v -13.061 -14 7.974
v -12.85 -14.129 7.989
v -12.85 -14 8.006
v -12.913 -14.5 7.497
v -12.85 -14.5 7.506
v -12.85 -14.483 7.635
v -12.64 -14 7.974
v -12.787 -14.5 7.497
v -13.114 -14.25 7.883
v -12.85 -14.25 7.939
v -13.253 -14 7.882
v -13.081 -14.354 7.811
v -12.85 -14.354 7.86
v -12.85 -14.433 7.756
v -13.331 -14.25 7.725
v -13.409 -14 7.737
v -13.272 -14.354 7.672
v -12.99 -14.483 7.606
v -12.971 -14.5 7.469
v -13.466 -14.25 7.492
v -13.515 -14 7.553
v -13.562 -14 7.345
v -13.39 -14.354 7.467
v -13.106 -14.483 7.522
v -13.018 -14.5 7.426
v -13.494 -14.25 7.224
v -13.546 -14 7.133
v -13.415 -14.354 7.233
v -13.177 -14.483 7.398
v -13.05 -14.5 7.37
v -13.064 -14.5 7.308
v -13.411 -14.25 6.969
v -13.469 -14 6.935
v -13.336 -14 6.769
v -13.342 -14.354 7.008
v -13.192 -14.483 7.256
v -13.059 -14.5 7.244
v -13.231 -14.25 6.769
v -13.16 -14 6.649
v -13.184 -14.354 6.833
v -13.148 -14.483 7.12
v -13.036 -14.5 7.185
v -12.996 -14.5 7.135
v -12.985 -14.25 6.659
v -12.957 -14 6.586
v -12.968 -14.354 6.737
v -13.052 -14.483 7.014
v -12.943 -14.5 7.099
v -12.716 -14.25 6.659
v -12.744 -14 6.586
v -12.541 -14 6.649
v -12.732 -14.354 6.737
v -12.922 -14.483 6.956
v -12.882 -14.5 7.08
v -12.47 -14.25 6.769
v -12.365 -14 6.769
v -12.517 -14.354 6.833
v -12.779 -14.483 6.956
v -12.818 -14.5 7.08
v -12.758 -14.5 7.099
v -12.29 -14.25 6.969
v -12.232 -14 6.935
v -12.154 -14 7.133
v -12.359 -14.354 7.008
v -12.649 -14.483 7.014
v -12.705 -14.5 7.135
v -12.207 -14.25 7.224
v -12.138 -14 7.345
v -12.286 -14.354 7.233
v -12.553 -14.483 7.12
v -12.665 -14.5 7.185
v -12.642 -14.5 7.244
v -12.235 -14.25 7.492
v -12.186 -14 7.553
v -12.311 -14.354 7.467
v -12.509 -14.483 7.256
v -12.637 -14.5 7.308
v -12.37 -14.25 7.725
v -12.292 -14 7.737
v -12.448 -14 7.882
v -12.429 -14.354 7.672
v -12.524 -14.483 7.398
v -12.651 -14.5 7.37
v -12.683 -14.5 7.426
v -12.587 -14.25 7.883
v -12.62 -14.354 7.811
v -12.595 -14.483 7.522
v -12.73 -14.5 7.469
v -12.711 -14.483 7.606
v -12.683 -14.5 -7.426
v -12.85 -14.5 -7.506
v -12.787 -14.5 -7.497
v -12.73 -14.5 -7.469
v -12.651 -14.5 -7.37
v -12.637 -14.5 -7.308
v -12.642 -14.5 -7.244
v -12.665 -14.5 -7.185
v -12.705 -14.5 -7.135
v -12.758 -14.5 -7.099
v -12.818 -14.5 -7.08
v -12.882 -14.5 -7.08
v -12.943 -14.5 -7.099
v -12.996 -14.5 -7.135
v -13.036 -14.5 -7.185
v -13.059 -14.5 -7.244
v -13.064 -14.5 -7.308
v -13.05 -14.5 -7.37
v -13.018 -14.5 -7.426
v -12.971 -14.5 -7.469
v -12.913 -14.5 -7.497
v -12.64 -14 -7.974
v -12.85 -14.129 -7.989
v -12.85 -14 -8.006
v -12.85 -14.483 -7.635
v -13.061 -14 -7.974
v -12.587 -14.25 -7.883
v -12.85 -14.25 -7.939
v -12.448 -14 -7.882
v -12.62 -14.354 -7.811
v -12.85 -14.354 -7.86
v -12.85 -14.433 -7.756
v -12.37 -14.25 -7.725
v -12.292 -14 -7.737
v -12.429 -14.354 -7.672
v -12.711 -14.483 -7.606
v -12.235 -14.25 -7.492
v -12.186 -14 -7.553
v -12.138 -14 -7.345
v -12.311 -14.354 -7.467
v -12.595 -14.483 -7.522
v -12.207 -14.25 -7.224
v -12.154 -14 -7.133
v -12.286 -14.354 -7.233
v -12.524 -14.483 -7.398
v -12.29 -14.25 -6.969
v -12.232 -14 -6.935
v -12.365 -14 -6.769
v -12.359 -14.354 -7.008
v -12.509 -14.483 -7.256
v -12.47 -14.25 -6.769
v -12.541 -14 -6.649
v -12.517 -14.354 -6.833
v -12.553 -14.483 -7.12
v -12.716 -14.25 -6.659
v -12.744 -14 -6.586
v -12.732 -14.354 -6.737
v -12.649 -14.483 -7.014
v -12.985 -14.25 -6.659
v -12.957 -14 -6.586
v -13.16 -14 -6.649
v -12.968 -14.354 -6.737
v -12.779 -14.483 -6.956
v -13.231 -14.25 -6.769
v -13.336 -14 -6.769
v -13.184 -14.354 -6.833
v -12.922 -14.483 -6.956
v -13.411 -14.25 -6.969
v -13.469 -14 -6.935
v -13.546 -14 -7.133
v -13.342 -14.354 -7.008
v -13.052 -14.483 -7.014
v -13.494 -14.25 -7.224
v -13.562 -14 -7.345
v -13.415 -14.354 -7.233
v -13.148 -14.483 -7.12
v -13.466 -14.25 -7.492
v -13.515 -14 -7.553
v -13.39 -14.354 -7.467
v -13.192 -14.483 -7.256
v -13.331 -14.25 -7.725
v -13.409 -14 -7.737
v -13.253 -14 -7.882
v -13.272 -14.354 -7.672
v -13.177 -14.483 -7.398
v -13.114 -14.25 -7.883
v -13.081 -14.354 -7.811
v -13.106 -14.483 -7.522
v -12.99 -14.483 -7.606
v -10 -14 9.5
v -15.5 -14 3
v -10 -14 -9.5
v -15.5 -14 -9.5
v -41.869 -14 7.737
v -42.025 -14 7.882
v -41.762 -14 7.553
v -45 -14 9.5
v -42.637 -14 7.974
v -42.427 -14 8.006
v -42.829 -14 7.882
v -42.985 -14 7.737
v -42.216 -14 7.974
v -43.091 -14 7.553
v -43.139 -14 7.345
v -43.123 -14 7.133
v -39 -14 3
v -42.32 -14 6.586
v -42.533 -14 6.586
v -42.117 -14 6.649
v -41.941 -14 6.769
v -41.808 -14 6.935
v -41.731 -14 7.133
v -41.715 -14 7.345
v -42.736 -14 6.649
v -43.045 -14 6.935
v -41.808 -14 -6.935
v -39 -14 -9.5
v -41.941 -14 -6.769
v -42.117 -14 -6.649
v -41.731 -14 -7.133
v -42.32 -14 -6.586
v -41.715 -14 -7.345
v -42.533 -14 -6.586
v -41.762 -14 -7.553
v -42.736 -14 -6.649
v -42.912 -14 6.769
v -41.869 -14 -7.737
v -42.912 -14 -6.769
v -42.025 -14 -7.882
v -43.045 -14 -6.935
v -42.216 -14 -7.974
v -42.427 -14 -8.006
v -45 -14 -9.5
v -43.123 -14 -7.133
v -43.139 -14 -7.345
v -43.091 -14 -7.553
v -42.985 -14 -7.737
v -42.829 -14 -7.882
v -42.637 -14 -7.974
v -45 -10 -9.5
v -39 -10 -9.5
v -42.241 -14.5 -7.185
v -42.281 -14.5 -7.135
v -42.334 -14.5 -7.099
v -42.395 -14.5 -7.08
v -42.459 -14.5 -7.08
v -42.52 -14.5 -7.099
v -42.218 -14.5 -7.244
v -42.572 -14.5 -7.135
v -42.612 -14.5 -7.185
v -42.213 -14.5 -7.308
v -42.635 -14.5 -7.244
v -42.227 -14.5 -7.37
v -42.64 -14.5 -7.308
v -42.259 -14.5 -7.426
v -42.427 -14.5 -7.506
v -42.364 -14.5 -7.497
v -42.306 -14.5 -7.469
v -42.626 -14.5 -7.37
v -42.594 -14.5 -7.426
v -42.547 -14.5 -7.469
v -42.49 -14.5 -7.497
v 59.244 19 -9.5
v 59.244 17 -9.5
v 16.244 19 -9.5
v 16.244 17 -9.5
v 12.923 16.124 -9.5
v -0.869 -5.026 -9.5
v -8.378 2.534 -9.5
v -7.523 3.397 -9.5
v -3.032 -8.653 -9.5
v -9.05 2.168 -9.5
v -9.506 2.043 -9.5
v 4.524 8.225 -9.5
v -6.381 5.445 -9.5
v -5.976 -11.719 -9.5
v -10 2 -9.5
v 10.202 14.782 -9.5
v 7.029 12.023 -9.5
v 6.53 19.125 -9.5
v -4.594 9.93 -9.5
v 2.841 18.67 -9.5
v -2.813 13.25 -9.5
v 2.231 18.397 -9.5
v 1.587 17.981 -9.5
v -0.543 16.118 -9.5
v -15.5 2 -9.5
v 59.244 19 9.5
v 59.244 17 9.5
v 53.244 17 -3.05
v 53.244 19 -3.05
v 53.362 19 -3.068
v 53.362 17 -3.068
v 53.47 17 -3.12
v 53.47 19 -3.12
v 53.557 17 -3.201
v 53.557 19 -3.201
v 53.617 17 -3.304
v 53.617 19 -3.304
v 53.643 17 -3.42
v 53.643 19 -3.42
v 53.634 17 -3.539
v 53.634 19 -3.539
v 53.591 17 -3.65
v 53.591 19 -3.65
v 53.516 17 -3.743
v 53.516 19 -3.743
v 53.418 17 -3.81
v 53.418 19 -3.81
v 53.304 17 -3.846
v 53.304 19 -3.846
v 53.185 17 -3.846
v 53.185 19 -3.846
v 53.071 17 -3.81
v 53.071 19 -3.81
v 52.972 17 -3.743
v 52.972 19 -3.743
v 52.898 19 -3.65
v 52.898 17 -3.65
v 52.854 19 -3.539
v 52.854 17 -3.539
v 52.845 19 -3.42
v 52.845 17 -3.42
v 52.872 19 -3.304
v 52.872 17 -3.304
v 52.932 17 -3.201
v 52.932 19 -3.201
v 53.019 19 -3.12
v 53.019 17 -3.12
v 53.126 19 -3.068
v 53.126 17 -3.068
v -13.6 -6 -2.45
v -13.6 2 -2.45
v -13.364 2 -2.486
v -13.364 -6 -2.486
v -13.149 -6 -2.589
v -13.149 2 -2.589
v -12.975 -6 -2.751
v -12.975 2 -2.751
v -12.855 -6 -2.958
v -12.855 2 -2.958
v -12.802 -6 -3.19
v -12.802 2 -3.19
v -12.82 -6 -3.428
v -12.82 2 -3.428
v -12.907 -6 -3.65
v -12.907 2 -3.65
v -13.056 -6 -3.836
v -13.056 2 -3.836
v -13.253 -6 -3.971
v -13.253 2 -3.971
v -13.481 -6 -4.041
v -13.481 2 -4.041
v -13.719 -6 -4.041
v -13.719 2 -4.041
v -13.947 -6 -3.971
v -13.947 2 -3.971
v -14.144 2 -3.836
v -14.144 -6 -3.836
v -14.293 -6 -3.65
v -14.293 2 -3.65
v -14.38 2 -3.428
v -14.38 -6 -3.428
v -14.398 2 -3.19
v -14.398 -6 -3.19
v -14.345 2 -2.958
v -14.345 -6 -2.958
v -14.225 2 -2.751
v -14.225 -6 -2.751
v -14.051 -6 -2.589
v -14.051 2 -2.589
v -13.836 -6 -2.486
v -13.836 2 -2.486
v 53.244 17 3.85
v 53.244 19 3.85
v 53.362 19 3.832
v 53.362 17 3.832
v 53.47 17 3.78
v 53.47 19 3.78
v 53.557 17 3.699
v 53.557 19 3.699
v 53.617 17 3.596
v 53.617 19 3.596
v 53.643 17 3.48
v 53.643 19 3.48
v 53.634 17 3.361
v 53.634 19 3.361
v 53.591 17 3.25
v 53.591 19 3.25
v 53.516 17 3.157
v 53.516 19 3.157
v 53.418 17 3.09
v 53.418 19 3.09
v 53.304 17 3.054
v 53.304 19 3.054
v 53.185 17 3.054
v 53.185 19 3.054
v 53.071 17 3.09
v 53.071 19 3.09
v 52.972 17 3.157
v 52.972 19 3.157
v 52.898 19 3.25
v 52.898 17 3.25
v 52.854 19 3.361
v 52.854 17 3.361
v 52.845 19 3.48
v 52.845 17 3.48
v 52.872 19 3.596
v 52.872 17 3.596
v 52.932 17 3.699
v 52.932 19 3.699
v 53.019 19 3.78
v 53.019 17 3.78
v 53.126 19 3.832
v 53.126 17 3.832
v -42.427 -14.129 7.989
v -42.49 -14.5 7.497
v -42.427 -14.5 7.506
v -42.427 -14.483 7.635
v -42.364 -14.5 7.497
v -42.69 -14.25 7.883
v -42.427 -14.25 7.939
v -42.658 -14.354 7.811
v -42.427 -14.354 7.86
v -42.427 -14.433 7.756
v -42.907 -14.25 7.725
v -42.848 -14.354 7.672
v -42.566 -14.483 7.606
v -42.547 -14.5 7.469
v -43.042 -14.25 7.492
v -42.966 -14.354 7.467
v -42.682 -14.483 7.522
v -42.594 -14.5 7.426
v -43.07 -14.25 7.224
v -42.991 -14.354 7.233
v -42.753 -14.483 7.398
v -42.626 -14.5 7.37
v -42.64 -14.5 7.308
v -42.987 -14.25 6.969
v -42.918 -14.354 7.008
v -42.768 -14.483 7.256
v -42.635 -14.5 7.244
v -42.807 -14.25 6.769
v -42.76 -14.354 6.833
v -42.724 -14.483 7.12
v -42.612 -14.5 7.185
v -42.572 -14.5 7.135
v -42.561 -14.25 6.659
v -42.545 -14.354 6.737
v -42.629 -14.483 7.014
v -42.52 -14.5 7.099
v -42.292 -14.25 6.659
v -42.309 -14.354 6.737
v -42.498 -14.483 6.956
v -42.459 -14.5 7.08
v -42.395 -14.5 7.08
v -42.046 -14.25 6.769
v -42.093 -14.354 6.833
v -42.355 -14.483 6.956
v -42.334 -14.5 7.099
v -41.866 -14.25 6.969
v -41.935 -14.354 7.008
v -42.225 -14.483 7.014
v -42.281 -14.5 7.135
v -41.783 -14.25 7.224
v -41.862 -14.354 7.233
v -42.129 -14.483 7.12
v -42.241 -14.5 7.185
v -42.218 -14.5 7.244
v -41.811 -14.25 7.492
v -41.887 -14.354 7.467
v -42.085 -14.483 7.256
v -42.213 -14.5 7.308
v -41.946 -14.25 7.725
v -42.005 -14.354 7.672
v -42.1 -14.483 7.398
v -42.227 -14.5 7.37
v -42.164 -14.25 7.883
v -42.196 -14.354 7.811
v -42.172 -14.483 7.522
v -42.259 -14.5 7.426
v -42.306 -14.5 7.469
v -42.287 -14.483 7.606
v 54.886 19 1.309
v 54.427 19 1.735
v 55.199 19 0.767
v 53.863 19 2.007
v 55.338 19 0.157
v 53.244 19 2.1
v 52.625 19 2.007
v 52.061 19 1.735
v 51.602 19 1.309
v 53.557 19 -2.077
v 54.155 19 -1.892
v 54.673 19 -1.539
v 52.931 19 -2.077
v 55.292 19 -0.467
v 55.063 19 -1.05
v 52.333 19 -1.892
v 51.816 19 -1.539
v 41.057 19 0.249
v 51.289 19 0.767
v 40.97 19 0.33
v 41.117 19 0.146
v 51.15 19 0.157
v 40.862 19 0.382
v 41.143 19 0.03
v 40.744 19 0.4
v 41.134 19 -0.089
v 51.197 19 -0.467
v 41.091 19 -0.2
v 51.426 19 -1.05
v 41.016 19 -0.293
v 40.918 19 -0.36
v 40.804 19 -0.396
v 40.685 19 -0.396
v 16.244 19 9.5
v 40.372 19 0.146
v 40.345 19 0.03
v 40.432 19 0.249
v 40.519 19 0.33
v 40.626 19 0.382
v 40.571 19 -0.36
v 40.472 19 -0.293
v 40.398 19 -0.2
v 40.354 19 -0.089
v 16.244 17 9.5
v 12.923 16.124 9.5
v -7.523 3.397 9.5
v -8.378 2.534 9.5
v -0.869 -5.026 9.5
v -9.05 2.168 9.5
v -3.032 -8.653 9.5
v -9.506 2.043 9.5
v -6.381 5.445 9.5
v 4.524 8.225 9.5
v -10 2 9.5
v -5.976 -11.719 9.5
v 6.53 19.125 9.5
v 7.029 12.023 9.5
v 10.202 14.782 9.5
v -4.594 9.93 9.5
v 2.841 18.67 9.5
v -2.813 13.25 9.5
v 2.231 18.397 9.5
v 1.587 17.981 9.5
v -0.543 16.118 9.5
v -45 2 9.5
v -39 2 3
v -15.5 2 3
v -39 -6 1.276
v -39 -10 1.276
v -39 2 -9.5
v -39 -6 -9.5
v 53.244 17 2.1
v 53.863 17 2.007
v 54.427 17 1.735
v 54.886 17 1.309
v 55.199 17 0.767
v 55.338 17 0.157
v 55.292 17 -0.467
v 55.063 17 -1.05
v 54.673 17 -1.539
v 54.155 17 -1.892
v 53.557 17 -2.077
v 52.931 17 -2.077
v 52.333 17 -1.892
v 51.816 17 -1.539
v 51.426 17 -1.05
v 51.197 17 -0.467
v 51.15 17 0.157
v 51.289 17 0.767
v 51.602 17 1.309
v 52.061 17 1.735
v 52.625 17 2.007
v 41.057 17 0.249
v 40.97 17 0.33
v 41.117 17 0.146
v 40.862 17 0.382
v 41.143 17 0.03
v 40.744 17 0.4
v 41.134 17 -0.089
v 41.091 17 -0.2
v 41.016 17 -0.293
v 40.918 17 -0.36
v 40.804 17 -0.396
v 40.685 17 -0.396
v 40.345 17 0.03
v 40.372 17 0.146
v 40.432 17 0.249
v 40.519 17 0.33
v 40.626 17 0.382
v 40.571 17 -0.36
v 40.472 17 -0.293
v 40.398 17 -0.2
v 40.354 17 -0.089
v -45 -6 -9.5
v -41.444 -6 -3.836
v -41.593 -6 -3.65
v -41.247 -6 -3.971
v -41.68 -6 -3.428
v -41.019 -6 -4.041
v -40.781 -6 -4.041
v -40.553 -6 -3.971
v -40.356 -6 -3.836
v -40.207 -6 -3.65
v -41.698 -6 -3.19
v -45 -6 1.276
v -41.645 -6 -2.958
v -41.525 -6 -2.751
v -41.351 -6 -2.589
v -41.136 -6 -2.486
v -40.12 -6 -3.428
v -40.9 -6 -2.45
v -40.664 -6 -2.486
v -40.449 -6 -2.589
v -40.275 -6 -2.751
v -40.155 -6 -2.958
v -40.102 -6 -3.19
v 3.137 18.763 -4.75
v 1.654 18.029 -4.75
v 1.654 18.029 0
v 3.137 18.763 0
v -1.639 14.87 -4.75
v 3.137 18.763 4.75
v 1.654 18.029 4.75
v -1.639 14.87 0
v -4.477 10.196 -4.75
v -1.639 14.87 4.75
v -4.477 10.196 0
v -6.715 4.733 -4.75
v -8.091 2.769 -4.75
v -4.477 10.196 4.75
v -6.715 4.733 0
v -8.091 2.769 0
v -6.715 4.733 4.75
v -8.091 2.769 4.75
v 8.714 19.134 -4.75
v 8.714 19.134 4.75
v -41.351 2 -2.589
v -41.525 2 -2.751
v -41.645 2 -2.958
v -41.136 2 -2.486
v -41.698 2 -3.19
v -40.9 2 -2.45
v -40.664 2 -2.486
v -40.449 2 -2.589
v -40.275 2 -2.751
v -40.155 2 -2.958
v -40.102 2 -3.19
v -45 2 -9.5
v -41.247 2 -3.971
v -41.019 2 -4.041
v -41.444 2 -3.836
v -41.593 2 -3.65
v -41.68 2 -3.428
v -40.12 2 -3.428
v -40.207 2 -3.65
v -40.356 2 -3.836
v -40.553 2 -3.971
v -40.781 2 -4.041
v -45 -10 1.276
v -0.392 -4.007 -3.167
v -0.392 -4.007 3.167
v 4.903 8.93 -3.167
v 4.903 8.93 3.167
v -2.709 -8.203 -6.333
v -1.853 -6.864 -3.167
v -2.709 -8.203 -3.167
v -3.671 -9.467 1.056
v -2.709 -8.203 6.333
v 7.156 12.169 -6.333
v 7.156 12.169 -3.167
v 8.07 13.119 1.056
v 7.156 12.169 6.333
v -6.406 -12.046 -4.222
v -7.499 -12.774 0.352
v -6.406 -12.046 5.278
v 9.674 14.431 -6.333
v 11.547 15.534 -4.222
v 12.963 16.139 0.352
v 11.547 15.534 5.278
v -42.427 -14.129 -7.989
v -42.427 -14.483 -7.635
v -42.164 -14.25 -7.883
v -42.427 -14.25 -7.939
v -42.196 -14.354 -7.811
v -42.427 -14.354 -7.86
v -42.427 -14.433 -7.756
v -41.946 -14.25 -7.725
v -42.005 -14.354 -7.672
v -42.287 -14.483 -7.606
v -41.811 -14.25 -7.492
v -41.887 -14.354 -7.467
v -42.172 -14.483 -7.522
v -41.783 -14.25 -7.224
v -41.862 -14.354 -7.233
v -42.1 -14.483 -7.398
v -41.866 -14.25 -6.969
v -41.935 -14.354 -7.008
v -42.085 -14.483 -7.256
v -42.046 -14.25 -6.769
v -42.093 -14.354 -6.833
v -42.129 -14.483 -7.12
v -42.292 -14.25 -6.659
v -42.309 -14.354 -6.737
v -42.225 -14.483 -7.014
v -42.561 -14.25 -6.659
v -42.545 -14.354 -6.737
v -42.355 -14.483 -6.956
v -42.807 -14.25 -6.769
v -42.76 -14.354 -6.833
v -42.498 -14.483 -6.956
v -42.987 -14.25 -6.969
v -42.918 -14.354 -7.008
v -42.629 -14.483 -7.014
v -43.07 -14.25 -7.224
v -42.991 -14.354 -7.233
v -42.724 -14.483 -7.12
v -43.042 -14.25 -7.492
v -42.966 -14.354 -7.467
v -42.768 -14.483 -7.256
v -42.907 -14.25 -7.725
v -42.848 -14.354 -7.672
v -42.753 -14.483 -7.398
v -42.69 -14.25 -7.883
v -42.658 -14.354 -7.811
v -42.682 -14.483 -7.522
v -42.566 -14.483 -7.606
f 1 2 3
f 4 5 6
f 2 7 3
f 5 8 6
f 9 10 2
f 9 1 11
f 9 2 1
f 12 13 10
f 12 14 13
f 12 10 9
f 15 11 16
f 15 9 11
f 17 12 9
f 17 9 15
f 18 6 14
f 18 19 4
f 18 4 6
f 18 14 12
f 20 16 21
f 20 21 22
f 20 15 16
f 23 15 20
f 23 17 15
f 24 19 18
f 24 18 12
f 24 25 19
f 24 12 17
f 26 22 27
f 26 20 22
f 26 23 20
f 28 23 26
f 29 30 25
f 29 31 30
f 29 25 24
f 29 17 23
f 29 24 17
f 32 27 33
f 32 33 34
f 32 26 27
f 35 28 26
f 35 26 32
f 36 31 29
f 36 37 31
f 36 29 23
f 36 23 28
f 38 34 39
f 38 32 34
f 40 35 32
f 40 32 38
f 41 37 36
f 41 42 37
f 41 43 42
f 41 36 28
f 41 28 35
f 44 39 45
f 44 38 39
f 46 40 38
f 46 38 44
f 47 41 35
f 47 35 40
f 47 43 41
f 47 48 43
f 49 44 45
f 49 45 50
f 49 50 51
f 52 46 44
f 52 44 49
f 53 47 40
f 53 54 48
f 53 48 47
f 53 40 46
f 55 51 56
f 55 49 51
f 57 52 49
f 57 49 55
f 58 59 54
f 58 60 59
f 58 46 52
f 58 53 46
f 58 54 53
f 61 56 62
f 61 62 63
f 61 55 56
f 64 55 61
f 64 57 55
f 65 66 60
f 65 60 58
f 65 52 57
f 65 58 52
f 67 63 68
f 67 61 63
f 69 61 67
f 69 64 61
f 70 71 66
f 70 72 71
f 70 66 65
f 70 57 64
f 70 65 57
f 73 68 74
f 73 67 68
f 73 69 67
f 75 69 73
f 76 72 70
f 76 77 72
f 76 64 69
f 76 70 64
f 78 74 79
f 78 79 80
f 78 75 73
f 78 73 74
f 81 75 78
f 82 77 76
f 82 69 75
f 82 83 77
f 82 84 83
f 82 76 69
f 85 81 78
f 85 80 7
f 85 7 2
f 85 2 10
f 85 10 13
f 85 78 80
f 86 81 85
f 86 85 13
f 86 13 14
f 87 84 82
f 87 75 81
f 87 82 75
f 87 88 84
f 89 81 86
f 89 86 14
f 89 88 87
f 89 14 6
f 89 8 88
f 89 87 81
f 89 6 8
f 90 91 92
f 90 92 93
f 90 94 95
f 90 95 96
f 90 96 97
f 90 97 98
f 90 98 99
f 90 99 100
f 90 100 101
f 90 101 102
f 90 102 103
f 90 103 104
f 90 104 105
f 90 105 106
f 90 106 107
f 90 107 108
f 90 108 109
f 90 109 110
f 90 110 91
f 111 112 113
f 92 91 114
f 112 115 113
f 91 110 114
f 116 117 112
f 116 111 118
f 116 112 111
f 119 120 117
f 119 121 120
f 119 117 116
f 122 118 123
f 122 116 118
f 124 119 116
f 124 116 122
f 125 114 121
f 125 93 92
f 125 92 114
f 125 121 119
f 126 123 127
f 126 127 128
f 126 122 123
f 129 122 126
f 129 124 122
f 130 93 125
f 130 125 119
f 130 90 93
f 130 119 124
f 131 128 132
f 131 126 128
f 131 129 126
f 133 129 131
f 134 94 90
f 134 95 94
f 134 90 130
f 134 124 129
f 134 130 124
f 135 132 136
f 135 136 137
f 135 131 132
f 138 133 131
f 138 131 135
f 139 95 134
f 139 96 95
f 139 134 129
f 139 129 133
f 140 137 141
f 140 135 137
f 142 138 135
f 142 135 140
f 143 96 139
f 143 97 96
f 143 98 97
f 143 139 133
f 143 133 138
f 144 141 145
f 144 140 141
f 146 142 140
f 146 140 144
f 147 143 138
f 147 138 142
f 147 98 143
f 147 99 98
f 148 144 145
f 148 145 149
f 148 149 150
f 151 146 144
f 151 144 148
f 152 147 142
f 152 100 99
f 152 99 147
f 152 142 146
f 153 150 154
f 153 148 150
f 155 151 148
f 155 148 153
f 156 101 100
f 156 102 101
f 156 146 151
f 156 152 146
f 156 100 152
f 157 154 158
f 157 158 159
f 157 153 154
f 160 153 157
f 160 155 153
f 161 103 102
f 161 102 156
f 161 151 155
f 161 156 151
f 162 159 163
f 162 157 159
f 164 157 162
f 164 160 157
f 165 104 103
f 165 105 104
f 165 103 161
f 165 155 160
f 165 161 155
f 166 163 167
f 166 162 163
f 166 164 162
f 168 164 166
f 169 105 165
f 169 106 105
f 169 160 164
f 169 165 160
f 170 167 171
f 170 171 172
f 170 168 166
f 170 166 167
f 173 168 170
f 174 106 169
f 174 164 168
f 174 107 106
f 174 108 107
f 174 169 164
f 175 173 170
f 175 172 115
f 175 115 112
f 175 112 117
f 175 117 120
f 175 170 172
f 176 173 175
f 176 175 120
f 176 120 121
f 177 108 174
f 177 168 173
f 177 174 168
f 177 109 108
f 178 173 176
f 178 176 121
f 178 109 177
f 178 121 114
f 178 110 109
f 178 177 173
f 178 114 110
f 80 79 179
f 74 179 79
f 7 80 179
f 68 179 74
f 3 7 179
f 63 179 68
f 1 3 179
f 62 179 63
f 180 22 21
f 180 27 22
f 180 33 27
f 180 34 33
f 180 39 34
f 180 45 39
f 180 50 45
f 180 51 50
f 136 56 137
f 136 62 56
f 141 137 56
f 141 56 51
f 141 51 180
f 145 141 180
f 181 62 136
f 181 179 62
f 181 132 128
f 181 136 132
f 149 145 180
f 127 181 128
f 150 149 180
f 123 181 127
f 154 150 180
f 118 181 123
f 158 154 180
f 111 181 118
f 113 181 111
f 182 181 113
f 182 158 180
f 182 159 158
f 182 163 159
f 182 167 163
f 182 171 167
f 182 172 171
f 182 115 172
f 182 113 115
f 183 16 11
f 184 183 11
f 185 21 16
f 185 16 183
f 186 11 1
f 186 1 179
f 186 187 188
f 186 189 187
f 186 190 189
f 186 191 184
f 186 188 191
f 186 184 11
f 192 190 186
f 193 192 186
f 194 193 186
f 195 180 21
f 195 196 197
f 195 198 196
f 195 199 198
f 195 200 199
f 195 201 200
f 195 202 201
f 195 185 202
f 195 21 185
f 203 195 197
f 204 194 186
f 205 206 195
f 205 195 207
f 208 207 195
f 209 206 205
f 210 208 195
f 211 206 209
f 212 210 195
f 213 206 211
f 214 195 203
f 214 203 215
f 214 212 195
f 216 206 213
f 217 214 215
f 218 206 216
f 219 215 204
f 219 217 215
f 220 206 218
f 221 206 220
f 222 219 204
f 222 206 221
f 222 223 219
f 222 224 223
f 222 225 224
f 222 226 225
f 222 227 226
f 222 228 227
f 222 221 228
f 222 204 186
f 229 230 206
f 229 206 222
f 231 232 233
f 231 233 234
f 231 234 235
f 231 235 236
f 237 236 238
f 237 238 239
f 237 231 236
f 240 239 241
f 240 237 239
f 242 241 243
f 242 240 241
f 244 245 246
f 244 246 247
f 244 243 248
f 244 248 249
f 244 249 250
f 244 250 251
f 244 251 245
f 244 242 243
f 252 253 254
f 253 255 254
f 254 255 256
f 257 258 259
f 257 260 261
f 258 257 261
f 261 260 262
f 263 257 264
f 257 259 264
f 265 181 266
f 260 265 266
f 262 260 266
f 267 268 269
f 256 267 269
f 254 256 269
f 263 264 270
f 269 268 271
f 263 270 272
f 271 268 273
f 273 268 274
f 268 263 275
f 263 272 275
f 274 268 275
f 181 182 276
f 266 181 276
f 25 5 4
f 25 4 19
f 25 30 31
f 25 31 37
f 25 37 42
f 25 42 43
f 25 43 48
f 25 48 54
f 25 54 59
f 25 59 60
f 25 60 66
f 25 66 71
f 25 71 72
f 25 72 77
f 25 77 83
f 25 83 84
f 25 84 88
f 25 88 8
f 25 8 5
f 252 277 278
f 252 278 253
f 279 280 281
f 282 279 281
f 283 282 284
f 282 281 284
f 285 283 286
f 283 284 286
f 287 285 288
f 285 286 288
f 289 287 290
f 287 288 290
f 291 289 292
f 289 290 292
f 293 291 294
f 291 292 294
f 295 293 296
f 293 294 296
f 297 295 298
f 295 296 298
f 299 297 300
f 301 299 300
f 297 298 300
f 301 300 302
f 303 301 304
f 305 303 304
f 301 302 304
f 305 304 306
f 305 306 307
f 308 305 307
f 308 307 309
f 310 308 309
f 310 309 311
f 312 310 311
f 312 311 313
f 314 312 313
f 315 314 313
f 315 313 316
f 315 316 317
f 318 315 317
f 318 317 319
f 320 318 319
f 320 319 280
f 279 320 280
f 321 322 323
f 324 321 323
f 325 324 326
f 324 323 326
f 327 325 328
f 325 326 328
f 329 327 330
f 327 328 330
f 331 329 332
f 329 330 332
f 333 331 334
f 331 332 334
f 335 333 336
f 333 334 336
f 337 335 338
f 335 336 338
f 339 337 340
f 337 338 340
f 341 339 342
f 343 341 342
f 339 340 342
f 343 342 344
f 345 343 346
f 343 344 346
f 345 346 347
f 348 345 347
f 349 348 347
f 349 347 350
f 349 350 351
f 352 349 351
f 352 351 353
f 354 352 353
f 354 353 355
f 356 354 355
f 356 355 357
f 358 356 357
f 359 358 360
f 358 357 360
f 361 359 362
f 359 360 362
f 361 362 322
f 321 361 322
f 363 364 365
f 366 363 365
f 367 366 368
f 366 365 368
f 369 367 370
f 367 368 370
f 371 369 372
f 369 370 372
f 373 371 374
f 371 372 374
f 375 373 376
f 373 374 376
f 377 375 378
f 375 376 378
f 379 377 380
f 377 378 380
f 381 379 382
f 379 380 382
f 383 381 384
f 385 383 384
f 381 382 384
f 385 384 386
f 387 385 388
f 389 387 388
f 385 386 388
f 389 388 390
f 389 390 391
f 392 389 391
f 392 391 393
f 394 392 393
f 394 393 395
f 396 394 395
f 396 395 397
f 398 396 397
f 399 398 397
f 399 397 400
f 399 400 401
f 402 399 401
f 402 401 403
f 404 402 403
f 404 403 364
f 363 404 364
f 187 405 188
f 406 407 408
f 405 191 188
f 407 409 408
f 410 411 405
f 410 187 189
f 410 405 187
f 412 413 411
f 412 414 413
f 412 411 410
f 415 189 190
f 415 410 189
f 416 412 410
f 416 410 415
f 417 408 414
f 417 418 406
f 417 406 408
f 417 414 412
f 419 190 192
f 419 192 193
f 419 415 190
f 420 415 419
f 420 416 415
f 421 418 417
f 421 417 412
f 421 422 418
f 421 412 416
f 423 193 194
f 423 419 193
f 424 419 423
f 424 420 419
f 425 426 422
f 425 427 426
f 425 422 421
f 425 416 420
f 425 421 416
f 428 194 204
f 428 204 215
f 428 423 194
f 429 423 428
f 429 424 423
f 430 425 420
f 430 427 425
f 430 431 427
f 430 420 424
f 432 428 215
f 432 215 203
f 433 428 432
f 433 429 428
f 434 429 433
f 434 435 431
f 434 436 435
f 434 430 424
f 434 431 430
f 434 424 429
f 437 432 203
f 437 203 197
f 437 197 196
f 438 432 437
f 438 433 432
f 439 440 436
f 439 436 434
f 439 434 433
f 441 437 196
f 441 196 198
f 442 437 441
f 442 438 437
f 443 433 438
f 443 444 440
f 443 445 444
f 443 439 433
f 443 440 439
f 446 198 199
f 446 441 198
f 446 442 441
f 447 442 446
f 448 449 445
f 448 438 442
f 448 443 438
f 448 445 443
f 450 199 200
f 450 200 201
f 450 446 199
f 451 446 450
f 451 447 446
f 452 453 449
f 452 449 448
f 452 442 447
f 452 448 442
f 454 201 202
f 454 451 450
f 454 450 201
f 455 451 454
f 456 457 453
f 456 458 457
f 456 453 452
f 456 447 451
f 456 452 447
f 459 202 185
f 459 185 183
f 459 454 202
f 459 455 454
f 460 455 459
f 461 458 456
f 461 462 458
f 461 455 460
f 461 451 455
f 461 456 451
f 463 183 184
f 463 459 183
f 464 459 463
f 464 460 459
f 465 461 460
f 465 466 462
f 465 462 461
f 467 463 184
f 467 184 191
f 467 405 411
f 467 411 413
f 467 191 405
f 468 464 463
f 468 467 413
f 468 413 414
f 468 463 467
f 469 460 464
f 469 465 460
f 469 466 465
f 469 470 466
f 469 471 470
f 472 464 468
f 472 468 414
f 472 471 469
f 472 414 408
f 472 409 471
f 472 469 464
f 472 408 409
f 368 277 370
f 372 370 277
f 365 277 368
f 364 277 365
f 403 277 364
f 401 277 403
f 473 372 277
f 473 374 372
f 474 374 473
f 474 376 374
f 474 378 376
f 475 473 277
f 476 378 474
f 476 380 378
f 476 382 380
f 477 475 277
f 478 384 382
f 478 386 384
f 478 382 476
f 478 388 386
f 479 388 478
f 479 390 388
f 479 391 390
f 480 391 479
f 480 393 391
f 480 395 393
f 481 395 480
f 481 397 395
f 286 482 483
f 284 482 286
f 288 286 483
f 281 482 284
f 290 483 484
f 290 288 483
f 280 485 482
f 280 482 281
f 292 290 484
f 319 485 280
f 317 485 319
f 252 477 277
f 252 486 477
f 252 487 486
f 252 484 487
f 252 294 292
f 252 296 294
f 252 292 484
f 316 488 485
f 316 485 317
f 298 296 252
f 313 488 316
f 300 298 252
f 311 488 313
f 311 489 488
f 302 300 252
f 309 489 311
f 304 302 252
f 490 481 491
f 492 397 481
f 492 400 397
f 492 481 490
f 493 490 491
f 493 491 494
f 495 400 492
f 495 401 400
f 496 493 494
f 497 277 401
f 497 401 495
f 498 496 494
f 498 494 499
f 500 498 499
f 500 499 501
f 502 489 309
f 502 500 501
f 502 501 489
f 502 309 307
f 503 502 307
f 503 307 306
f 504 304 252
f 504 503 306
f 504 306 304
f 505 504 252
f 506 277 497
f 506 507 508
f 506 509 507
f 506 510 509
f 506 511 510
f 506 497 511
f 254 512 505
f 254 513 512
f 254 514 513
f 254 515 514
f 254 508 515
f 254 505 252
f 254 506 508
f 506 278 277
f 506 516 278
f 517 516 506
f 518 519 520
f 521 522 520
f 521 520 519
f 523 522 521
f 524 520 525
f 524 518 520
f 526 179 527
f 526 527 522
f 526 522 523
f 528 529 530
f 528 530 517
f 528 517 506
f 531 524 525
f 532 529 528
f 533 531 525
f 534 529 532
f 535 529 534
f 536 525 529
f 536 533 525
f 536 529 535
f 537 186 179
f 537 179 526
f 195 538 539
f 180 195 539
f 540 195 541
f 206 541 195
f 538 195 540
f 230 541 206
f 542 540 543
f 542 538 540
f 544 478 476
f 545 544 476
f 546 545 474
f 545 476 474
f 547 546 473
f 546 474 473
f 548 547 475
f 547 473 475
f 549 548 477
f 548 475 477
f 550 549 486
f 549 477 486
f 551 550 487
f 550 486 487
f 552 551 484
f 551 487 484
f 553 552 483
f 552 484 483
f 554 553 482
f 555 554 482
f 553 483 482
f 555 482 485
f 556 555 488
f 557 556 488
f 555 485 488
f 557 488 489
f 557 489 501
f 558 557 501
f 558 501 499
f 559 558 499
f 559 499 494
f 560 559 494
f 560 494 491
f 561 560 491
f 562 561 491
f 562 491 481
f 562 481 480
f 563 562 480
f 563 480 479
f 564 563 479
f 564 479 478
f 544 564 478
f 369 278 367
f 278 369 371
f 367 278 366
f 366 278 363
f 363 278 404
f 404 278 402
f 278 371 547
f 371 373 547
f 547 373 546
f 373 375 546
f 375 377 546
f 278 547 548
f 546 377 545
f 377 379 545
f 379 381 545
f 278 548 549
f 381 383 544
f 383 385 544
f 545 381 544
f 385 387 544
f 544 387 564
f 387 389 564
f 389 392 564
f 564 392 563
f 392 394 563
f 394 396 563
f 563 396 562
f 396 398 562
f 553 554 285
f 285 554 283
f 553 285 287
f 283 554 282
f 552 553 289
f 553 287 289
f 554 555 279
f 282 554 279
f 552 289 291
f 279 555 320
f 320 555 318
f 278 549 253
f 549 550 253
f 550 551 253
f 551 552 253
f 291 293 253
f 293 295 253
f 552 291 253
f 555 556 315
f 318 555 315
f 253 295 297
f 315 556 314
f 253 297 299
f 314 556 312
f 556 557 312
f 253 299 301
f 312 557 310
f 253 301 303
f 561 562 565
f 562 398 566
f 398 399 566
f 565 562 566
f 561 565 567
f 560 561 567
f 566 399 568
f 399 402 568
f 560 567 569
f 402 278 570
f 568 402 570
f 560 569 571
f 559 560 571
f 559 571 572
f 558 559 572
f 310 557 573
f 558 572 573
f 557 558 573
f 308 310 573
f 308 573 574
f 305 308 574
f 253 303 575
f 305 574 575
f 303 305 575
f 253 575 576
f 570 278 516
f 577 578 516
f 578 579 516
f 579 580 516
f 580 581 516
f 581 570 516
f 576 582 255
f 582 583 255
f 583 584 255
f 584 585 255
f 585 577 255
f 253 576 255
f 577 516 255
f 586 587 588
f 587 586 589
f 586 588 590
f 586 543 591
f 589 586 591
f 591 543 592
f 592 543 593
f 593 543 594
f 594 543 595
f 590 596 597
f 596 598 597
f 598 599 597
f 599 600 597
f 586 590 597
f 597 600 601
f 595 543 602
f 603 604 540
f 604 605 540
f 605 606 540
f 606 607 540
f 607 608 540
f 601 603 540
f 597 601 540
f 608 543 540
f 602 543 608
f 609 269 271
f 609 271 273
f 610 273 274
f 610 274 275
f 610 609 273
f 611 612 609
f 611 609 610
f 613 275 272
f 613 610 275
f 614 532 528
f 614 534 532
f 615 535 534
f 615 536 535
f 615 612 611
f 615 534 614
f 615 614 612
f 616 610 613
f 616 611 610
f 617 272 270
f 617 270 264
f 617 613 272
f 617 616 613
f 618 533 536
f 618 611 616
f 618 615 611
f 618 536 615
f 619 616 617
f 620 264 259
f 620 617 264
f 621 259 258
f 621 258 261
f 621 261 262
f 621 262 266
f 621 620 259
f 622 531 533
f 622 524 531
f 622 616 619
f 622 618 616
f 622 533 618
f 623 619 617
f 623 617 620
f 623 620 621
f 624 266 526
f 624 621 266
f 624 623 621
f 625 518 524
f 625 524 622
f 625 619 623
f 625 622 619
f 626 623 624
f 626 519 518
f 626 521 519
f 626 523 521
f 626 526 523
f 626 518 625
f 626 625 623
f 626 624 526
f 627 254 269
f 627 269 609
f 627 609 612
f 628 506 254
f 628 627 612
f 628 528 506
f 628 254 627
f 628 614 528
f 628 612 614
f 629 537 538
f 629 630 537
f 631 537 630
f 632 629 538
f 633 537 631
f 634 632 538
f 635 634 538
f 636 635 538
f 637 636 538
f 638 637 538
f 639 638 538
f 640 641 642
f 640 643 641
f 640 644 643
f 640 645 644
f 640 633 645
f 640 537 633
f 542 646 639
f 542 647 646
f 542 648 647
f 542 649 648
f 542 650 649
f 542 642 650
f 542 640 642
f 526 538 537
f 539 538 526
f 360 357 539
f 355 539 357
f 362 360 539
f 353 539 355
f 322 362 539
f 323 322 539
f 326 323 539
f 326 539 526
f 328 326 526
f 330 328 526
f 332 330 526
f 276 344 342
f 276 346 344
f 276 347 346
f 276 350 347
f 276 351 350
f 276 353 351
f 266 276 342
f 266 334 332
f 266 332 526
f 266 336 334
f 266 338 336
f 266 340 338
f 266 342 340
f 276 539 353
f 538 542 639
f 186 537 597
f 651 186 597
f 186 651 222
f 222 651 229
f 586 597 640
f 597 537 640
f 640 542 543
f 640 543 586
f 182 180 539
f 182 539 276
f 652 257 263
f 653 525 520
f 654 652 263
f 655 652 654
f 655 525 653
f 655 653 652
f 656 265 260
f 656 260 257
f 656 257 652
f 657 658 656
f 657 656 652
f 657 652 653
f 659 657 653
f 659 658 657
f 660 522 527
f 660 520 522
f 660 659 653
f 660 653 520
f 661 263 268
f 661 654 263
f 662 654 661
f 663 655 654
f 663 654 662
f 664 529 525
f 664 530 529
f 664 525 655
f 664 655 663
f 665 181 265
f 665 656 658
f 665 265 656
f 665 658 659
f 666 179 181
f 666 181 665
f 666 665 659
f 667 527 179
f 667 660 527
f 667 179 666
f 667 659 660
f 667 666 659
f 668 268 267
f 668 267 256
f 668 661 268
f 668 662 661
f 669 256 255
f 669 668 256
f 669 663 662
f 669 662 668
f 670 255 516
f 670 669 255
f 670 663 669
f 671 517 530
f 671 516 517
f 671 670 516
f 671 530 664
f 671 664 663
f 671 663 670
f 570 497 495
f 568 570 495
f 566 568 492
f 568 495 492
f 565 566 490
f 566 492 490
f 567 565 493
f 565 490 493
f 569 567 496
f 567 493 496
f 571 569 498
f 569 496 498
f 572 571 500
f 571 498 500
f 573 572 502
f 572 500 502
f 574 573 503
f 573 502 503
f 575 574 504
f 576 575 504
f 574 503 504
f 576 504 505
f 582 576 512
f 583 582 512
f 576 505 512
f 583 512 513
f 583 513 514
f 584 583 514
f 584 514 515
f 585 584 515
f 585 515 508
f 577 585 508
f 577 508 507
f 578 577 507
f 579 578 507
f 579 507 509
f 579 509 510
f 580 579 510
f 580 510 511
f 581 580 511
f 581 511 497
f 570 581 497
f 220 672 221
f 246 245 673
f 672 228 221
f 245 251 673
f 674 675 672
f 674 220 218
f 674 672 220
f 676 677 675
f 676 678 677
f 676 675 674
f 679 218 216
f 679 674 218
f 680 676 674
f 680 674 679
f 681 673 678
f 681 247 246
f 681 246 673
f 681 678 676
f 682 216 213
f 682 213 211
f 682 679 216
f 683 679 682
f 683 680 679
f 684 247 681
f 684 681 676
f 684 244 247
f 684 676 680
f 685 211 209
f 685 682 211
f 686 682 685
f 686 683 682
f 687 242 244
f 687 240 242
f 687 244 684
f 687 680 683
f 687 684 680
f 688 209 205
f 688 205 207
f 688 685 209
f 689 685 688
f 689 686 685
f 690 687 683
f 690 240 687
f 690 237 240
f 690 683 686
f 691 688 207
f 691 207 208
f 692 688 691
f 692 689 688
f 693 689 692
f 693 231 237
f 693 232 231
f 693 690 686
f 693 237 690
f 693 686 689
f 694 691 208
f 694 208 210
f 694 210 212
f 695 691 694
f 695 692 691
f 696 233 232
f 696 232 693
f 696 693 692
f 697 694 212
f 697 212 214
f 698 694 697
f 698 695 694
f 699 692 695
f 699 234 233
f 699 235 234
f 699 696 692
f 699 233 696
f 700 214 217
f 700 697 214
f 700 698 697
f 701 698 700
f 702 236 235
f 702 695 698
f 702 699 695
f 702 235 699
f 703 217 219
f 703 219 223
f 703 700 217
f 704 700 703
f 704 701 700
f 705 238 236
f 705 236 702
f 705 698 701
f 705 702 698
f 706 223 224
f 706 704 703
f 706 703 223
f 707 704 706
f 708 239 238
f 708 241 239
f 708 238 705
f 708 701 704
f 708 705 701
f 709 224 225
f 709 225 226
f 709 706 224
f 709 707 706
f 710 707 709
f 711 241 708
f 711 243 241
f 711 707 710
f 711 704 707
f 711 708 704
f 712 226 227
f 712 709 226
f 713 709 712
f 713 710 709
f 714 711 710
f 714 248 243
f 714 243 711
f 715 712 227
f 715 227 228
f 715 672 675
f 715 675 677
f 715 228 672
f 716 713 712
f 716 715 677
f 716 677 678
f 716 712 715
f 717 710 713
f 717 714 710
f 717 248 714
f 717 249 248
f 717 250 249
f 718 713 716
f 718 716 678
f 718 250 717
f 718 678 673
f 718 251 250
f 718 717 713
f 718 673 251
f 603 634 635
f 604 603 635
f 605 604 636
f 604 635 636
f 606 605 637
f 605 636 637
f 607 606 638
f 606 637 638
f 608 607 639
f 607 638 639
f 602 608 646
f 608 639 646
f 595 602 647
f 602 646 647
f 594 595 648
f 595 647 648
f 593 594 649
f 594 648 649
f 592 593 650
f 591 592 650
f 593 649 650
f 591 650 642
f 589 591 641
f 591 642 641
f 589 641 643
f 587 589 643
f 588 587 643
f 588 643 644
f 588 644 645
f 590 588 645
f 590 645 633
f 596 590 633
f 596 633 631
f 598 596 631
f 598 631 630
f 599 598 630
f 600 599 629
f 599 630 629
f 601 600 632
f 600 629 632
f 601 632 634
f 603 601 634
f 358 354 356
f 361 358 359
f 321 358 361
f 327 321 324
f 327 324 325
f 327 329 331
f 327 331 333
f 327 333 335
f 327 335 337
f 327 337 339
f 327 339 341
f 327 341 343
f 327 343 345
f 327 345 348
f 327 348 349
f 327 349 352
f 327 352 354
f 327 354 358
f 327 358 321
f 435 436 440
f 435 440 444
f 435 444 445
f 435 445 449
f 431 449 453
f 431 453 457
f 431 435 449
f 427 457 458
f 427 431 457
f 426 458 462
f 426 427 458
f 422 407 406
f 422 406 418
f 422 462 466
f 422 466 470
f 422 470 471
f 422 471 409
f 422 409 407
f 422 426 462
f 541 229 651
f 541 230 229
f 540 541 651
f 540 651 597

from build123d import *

# Parameters (mm, degrees)
SKETCH1_W            = 35
SKETCH1_H            = 19
BOSS_EXTRUDE1_DEPTH  = 2
SKETCH2_W            = 35
SKETCH2_H            = 19
BOSS_EXTRUDE2_DEPTH  = 14
SKETCH5_W            = 23.5
SKETCH5_H            = 12.5
CUT_EXTRUDE1_DEPTH   = 16
SKETCH6_W            = 12
SKETCH6_H            = 4
CUT_EXTRUDE2_DEPTH   = 35
BOSS_EXTRUDE7_DEPTH  = 19
SKETCH17_W           = 19
SKETCH17_H           = 2
BOSS_EXTRUDE8_DEPTH  = 40
SKETCH10_R           = 0.713910761
BOSS_EXTRUDE9_DEPTH  = 0.5
FILLET2_R            = 0.5
SKETCH18_R           = 0.4
CUT_EXTRUDE6_DEPTH   = 10.5
SKETCH19_R           = 2.1
CUT_EXTRUDE7_DEPTH   = 10.5
SKETCH20_W           = 19
SKETCH20_H           = 2
BOSS_EXTRUDE10_DEPTH = 3
SKETCH7_R            = 0.8
CUT_EXTRUDE8_DEPTH   = 8


with BuildPart() as part:
    # Sketch1 → Boss-Extrude1 (new body)
    with BuildSketch(Plane(origin=(0, 0, 0), x_dir=(1, 0, 0), z_dir=(0, 1, 0))):
        with Locations((-27.5, 0)):
            Rectangle(SKETCH1_W, SKETCH1_H)
    extrude(amount=BOSS_EXTRUDE1_DEPTH)

    # Sketch2 → Boss-Extrude2 (add)
    with BuildSketch(Plane(origin=(0, 0, 0), x_dir=(-1, 0, 0), z_dir=(0, -1, 0))):
        with Locations((27.5, 0)):
            Rectangle(SKETCH2_W, SKETCH2_H)
    extrude(amount=BOSS_EXTRUDE2_DEPTH)

    # Sketch5 → Cut-Extrude1 (cut)
    with BuildSketch(Plane(origin=(0, 2, 0), x_dir=(1, 0, 0), z_dir=(0, 1, 0))):
        with Locations((-27.25, 3.25)):
            Rectangle(SKETCH5_W, SKETCH5_H)
    extrude(amount=-CUT_EXTRUDE1_DEPTH, mode=Mode.SUBTRACT)

    # Sketch6 → Cut-Extrude2 (cut)
    with BuildSketch(Plane.ZY.offset(15.5)):
        with Locations((-4.723551551, -8)):
            Rectangle(SKETCH6_W, SKETCH6_H)
    extrude(amount=CUT_EXTRUDE2_DEPTH, mode=Mode.SUBTRACT)

    # Sketch15 → Boss-Extrude7 (add)
    with BuildSketch(Plane.XY.offset(9.5)):
        with BuildLine():
            Line((16.244255375, 17), (16.244255375, 19))
            add(Edge.make_bspline(
                [(16.244255375, 19), (11.212607589, 19), (4.066469068, 19.553217376), (-0.106803104, 16.983328742), (-5.242294622, 11.037813369), (-6.977758039, 2), (-10, 2)],
                knots=[0, 0, 0, 0, 0.246137696, 0.311425048, 0.652873521, 1, 1, 1, 1], degree=3))
            Line((-10, 2), (-10, -14))
            add(Edge.make_bspline(
                [(-10, -14), (5.215691354, -8.082881299), (-1.571658903, 13.967697147), (16.244255375, 17)],
                knots=[0, 0, 0, 0, 1, 1, 1, 1], degree=3))
        make_face()
    extrude(amount=-BOSS_EXTRUDE7_DEPTH)

    # Sketch17 → Boss-Extrude8 (add)
    with BuildSketch(Plane(origin=(16.244255375, 0, 0), x_dir=(0, 0, -1), z_dir=(1, 0, 0))):
        with Locations((0, 18)):
            Rectangle(SKETCH17_W, SKETCH17_H)
    extrude(amount=BOSS_EXTRUDE8_DEPTH)

    # Sketch10 → Boss-Extrude9 (add)
    with BuildSketch(Plane(origin=(0, -14, 0), x_dir=(-1, 0, 0), z_dir=(0, -1, 0))):
        with Locations(Location((42.426696663, 7.292088489, 0), (0, 0, 90))):
            Circle(SKETCH10_R)
        with Locations(Location((12.850393701, 7.292088489, 0), (0, 0, 90))):
            Circle(SKETCH10_R)
        with Locations(Location((12.850393701, -7.292088489, 0), (0, 0, 270))):
            Circle(SKETCH10_R)
        with Locations(Location((42.426696663, -7.292088489, 0), (0, 0, 270))):
            Circle(SKETCH10_R)
    extrude(amount=BOSS_EXTRUDE9_DEPTH)

    # Fillet2
    fillet2_edges = [part.edges().sort_by_distance(p)[0] for p in [
        (-12.850393701, -14.5, 6.578177728),
        (-42.426696663, -14.5, 6.578177728),
        (-42.426696663, -14.5, -6.578177728),
        (-12.850393701, -14.5, -6.578177728),
    ]]
    fillet(fillet2_edges, radius=FILLET2_R - 0.0001)  # a hair under: the kernel refuses the full size

    # Sketch18 → Cut-Extrude6 (cut)
    with BuildSketch(Plane(origin=(0, 19, 0), x_dir=(1, 0, 0), z_dir=(0, 1, 0))):
        with Locations(Location((53.244255375, 3.45, 0), (0, 0, 270))):
            Circle(SKETCH18_R)
        with Locations(Location((53.244255375, -3.45, 0), (0, 0, 270))):
            Circle(SKETCH18_R)
        with Locations((50.214832051, 25.851748831)):
            Circle(SKETCH18_R)
        with Locations(Location((40.744255375, 0, 0), (0, 0, 270))):
            Circle(SKETCH18_R)
    extrude(amount=-CUT_EXTRUDE6_DEPTH, mode=Mode.SUBTRACT)

    # Sketch19 → Cut-Extrude7 (cut)
    with BuildSketch(Plane(origin=(0, 19, 0), x_dir=(1, 0, 0), z_dir=(0, 1, 0))):
        with Locations(Location((53.244255375, 0, 0), (0, 0, 270))):
            Circle(SKETCH19_R)
    extrude(amount=-CUT_EXTRUDE7_DEPTH, mode=Mode.SUBTRACT)

    # Sketch20 → Boss-Extrude10 (add)
    with BuildSketch(Plane(origin=(56.244255375, 0, 0), x_dir=(0, 0, -1), z_dir=(1, 0, 0))):
        with Locations((0, 18)):
            Rectangle(SKETCH20_W, SKETCH20_H)
    extrude(amount=BOSS_EXTRUDE10_DEPTH)

    # Sketch7 → Cut-Extrude8 (cut)
    with BuildSketch(Plane(origin=(0, 2, 0), x_dir=(1, 0, 0), z_dir=(0, 1, 0))):
        with Locations(Location((-40.9, 3.25, 0), (0, 0, 270))):
            Circle(SKETCH7_R)
        with Locations(Location((-13.6, 3.25, 0), (0, 0, 270))):
            Circle(SKETCH7_R)
    extrude(amount=-CUT_EXTRUDE8_DEPTH, mode=Mode.SUBTRACT)


solid = part.part
